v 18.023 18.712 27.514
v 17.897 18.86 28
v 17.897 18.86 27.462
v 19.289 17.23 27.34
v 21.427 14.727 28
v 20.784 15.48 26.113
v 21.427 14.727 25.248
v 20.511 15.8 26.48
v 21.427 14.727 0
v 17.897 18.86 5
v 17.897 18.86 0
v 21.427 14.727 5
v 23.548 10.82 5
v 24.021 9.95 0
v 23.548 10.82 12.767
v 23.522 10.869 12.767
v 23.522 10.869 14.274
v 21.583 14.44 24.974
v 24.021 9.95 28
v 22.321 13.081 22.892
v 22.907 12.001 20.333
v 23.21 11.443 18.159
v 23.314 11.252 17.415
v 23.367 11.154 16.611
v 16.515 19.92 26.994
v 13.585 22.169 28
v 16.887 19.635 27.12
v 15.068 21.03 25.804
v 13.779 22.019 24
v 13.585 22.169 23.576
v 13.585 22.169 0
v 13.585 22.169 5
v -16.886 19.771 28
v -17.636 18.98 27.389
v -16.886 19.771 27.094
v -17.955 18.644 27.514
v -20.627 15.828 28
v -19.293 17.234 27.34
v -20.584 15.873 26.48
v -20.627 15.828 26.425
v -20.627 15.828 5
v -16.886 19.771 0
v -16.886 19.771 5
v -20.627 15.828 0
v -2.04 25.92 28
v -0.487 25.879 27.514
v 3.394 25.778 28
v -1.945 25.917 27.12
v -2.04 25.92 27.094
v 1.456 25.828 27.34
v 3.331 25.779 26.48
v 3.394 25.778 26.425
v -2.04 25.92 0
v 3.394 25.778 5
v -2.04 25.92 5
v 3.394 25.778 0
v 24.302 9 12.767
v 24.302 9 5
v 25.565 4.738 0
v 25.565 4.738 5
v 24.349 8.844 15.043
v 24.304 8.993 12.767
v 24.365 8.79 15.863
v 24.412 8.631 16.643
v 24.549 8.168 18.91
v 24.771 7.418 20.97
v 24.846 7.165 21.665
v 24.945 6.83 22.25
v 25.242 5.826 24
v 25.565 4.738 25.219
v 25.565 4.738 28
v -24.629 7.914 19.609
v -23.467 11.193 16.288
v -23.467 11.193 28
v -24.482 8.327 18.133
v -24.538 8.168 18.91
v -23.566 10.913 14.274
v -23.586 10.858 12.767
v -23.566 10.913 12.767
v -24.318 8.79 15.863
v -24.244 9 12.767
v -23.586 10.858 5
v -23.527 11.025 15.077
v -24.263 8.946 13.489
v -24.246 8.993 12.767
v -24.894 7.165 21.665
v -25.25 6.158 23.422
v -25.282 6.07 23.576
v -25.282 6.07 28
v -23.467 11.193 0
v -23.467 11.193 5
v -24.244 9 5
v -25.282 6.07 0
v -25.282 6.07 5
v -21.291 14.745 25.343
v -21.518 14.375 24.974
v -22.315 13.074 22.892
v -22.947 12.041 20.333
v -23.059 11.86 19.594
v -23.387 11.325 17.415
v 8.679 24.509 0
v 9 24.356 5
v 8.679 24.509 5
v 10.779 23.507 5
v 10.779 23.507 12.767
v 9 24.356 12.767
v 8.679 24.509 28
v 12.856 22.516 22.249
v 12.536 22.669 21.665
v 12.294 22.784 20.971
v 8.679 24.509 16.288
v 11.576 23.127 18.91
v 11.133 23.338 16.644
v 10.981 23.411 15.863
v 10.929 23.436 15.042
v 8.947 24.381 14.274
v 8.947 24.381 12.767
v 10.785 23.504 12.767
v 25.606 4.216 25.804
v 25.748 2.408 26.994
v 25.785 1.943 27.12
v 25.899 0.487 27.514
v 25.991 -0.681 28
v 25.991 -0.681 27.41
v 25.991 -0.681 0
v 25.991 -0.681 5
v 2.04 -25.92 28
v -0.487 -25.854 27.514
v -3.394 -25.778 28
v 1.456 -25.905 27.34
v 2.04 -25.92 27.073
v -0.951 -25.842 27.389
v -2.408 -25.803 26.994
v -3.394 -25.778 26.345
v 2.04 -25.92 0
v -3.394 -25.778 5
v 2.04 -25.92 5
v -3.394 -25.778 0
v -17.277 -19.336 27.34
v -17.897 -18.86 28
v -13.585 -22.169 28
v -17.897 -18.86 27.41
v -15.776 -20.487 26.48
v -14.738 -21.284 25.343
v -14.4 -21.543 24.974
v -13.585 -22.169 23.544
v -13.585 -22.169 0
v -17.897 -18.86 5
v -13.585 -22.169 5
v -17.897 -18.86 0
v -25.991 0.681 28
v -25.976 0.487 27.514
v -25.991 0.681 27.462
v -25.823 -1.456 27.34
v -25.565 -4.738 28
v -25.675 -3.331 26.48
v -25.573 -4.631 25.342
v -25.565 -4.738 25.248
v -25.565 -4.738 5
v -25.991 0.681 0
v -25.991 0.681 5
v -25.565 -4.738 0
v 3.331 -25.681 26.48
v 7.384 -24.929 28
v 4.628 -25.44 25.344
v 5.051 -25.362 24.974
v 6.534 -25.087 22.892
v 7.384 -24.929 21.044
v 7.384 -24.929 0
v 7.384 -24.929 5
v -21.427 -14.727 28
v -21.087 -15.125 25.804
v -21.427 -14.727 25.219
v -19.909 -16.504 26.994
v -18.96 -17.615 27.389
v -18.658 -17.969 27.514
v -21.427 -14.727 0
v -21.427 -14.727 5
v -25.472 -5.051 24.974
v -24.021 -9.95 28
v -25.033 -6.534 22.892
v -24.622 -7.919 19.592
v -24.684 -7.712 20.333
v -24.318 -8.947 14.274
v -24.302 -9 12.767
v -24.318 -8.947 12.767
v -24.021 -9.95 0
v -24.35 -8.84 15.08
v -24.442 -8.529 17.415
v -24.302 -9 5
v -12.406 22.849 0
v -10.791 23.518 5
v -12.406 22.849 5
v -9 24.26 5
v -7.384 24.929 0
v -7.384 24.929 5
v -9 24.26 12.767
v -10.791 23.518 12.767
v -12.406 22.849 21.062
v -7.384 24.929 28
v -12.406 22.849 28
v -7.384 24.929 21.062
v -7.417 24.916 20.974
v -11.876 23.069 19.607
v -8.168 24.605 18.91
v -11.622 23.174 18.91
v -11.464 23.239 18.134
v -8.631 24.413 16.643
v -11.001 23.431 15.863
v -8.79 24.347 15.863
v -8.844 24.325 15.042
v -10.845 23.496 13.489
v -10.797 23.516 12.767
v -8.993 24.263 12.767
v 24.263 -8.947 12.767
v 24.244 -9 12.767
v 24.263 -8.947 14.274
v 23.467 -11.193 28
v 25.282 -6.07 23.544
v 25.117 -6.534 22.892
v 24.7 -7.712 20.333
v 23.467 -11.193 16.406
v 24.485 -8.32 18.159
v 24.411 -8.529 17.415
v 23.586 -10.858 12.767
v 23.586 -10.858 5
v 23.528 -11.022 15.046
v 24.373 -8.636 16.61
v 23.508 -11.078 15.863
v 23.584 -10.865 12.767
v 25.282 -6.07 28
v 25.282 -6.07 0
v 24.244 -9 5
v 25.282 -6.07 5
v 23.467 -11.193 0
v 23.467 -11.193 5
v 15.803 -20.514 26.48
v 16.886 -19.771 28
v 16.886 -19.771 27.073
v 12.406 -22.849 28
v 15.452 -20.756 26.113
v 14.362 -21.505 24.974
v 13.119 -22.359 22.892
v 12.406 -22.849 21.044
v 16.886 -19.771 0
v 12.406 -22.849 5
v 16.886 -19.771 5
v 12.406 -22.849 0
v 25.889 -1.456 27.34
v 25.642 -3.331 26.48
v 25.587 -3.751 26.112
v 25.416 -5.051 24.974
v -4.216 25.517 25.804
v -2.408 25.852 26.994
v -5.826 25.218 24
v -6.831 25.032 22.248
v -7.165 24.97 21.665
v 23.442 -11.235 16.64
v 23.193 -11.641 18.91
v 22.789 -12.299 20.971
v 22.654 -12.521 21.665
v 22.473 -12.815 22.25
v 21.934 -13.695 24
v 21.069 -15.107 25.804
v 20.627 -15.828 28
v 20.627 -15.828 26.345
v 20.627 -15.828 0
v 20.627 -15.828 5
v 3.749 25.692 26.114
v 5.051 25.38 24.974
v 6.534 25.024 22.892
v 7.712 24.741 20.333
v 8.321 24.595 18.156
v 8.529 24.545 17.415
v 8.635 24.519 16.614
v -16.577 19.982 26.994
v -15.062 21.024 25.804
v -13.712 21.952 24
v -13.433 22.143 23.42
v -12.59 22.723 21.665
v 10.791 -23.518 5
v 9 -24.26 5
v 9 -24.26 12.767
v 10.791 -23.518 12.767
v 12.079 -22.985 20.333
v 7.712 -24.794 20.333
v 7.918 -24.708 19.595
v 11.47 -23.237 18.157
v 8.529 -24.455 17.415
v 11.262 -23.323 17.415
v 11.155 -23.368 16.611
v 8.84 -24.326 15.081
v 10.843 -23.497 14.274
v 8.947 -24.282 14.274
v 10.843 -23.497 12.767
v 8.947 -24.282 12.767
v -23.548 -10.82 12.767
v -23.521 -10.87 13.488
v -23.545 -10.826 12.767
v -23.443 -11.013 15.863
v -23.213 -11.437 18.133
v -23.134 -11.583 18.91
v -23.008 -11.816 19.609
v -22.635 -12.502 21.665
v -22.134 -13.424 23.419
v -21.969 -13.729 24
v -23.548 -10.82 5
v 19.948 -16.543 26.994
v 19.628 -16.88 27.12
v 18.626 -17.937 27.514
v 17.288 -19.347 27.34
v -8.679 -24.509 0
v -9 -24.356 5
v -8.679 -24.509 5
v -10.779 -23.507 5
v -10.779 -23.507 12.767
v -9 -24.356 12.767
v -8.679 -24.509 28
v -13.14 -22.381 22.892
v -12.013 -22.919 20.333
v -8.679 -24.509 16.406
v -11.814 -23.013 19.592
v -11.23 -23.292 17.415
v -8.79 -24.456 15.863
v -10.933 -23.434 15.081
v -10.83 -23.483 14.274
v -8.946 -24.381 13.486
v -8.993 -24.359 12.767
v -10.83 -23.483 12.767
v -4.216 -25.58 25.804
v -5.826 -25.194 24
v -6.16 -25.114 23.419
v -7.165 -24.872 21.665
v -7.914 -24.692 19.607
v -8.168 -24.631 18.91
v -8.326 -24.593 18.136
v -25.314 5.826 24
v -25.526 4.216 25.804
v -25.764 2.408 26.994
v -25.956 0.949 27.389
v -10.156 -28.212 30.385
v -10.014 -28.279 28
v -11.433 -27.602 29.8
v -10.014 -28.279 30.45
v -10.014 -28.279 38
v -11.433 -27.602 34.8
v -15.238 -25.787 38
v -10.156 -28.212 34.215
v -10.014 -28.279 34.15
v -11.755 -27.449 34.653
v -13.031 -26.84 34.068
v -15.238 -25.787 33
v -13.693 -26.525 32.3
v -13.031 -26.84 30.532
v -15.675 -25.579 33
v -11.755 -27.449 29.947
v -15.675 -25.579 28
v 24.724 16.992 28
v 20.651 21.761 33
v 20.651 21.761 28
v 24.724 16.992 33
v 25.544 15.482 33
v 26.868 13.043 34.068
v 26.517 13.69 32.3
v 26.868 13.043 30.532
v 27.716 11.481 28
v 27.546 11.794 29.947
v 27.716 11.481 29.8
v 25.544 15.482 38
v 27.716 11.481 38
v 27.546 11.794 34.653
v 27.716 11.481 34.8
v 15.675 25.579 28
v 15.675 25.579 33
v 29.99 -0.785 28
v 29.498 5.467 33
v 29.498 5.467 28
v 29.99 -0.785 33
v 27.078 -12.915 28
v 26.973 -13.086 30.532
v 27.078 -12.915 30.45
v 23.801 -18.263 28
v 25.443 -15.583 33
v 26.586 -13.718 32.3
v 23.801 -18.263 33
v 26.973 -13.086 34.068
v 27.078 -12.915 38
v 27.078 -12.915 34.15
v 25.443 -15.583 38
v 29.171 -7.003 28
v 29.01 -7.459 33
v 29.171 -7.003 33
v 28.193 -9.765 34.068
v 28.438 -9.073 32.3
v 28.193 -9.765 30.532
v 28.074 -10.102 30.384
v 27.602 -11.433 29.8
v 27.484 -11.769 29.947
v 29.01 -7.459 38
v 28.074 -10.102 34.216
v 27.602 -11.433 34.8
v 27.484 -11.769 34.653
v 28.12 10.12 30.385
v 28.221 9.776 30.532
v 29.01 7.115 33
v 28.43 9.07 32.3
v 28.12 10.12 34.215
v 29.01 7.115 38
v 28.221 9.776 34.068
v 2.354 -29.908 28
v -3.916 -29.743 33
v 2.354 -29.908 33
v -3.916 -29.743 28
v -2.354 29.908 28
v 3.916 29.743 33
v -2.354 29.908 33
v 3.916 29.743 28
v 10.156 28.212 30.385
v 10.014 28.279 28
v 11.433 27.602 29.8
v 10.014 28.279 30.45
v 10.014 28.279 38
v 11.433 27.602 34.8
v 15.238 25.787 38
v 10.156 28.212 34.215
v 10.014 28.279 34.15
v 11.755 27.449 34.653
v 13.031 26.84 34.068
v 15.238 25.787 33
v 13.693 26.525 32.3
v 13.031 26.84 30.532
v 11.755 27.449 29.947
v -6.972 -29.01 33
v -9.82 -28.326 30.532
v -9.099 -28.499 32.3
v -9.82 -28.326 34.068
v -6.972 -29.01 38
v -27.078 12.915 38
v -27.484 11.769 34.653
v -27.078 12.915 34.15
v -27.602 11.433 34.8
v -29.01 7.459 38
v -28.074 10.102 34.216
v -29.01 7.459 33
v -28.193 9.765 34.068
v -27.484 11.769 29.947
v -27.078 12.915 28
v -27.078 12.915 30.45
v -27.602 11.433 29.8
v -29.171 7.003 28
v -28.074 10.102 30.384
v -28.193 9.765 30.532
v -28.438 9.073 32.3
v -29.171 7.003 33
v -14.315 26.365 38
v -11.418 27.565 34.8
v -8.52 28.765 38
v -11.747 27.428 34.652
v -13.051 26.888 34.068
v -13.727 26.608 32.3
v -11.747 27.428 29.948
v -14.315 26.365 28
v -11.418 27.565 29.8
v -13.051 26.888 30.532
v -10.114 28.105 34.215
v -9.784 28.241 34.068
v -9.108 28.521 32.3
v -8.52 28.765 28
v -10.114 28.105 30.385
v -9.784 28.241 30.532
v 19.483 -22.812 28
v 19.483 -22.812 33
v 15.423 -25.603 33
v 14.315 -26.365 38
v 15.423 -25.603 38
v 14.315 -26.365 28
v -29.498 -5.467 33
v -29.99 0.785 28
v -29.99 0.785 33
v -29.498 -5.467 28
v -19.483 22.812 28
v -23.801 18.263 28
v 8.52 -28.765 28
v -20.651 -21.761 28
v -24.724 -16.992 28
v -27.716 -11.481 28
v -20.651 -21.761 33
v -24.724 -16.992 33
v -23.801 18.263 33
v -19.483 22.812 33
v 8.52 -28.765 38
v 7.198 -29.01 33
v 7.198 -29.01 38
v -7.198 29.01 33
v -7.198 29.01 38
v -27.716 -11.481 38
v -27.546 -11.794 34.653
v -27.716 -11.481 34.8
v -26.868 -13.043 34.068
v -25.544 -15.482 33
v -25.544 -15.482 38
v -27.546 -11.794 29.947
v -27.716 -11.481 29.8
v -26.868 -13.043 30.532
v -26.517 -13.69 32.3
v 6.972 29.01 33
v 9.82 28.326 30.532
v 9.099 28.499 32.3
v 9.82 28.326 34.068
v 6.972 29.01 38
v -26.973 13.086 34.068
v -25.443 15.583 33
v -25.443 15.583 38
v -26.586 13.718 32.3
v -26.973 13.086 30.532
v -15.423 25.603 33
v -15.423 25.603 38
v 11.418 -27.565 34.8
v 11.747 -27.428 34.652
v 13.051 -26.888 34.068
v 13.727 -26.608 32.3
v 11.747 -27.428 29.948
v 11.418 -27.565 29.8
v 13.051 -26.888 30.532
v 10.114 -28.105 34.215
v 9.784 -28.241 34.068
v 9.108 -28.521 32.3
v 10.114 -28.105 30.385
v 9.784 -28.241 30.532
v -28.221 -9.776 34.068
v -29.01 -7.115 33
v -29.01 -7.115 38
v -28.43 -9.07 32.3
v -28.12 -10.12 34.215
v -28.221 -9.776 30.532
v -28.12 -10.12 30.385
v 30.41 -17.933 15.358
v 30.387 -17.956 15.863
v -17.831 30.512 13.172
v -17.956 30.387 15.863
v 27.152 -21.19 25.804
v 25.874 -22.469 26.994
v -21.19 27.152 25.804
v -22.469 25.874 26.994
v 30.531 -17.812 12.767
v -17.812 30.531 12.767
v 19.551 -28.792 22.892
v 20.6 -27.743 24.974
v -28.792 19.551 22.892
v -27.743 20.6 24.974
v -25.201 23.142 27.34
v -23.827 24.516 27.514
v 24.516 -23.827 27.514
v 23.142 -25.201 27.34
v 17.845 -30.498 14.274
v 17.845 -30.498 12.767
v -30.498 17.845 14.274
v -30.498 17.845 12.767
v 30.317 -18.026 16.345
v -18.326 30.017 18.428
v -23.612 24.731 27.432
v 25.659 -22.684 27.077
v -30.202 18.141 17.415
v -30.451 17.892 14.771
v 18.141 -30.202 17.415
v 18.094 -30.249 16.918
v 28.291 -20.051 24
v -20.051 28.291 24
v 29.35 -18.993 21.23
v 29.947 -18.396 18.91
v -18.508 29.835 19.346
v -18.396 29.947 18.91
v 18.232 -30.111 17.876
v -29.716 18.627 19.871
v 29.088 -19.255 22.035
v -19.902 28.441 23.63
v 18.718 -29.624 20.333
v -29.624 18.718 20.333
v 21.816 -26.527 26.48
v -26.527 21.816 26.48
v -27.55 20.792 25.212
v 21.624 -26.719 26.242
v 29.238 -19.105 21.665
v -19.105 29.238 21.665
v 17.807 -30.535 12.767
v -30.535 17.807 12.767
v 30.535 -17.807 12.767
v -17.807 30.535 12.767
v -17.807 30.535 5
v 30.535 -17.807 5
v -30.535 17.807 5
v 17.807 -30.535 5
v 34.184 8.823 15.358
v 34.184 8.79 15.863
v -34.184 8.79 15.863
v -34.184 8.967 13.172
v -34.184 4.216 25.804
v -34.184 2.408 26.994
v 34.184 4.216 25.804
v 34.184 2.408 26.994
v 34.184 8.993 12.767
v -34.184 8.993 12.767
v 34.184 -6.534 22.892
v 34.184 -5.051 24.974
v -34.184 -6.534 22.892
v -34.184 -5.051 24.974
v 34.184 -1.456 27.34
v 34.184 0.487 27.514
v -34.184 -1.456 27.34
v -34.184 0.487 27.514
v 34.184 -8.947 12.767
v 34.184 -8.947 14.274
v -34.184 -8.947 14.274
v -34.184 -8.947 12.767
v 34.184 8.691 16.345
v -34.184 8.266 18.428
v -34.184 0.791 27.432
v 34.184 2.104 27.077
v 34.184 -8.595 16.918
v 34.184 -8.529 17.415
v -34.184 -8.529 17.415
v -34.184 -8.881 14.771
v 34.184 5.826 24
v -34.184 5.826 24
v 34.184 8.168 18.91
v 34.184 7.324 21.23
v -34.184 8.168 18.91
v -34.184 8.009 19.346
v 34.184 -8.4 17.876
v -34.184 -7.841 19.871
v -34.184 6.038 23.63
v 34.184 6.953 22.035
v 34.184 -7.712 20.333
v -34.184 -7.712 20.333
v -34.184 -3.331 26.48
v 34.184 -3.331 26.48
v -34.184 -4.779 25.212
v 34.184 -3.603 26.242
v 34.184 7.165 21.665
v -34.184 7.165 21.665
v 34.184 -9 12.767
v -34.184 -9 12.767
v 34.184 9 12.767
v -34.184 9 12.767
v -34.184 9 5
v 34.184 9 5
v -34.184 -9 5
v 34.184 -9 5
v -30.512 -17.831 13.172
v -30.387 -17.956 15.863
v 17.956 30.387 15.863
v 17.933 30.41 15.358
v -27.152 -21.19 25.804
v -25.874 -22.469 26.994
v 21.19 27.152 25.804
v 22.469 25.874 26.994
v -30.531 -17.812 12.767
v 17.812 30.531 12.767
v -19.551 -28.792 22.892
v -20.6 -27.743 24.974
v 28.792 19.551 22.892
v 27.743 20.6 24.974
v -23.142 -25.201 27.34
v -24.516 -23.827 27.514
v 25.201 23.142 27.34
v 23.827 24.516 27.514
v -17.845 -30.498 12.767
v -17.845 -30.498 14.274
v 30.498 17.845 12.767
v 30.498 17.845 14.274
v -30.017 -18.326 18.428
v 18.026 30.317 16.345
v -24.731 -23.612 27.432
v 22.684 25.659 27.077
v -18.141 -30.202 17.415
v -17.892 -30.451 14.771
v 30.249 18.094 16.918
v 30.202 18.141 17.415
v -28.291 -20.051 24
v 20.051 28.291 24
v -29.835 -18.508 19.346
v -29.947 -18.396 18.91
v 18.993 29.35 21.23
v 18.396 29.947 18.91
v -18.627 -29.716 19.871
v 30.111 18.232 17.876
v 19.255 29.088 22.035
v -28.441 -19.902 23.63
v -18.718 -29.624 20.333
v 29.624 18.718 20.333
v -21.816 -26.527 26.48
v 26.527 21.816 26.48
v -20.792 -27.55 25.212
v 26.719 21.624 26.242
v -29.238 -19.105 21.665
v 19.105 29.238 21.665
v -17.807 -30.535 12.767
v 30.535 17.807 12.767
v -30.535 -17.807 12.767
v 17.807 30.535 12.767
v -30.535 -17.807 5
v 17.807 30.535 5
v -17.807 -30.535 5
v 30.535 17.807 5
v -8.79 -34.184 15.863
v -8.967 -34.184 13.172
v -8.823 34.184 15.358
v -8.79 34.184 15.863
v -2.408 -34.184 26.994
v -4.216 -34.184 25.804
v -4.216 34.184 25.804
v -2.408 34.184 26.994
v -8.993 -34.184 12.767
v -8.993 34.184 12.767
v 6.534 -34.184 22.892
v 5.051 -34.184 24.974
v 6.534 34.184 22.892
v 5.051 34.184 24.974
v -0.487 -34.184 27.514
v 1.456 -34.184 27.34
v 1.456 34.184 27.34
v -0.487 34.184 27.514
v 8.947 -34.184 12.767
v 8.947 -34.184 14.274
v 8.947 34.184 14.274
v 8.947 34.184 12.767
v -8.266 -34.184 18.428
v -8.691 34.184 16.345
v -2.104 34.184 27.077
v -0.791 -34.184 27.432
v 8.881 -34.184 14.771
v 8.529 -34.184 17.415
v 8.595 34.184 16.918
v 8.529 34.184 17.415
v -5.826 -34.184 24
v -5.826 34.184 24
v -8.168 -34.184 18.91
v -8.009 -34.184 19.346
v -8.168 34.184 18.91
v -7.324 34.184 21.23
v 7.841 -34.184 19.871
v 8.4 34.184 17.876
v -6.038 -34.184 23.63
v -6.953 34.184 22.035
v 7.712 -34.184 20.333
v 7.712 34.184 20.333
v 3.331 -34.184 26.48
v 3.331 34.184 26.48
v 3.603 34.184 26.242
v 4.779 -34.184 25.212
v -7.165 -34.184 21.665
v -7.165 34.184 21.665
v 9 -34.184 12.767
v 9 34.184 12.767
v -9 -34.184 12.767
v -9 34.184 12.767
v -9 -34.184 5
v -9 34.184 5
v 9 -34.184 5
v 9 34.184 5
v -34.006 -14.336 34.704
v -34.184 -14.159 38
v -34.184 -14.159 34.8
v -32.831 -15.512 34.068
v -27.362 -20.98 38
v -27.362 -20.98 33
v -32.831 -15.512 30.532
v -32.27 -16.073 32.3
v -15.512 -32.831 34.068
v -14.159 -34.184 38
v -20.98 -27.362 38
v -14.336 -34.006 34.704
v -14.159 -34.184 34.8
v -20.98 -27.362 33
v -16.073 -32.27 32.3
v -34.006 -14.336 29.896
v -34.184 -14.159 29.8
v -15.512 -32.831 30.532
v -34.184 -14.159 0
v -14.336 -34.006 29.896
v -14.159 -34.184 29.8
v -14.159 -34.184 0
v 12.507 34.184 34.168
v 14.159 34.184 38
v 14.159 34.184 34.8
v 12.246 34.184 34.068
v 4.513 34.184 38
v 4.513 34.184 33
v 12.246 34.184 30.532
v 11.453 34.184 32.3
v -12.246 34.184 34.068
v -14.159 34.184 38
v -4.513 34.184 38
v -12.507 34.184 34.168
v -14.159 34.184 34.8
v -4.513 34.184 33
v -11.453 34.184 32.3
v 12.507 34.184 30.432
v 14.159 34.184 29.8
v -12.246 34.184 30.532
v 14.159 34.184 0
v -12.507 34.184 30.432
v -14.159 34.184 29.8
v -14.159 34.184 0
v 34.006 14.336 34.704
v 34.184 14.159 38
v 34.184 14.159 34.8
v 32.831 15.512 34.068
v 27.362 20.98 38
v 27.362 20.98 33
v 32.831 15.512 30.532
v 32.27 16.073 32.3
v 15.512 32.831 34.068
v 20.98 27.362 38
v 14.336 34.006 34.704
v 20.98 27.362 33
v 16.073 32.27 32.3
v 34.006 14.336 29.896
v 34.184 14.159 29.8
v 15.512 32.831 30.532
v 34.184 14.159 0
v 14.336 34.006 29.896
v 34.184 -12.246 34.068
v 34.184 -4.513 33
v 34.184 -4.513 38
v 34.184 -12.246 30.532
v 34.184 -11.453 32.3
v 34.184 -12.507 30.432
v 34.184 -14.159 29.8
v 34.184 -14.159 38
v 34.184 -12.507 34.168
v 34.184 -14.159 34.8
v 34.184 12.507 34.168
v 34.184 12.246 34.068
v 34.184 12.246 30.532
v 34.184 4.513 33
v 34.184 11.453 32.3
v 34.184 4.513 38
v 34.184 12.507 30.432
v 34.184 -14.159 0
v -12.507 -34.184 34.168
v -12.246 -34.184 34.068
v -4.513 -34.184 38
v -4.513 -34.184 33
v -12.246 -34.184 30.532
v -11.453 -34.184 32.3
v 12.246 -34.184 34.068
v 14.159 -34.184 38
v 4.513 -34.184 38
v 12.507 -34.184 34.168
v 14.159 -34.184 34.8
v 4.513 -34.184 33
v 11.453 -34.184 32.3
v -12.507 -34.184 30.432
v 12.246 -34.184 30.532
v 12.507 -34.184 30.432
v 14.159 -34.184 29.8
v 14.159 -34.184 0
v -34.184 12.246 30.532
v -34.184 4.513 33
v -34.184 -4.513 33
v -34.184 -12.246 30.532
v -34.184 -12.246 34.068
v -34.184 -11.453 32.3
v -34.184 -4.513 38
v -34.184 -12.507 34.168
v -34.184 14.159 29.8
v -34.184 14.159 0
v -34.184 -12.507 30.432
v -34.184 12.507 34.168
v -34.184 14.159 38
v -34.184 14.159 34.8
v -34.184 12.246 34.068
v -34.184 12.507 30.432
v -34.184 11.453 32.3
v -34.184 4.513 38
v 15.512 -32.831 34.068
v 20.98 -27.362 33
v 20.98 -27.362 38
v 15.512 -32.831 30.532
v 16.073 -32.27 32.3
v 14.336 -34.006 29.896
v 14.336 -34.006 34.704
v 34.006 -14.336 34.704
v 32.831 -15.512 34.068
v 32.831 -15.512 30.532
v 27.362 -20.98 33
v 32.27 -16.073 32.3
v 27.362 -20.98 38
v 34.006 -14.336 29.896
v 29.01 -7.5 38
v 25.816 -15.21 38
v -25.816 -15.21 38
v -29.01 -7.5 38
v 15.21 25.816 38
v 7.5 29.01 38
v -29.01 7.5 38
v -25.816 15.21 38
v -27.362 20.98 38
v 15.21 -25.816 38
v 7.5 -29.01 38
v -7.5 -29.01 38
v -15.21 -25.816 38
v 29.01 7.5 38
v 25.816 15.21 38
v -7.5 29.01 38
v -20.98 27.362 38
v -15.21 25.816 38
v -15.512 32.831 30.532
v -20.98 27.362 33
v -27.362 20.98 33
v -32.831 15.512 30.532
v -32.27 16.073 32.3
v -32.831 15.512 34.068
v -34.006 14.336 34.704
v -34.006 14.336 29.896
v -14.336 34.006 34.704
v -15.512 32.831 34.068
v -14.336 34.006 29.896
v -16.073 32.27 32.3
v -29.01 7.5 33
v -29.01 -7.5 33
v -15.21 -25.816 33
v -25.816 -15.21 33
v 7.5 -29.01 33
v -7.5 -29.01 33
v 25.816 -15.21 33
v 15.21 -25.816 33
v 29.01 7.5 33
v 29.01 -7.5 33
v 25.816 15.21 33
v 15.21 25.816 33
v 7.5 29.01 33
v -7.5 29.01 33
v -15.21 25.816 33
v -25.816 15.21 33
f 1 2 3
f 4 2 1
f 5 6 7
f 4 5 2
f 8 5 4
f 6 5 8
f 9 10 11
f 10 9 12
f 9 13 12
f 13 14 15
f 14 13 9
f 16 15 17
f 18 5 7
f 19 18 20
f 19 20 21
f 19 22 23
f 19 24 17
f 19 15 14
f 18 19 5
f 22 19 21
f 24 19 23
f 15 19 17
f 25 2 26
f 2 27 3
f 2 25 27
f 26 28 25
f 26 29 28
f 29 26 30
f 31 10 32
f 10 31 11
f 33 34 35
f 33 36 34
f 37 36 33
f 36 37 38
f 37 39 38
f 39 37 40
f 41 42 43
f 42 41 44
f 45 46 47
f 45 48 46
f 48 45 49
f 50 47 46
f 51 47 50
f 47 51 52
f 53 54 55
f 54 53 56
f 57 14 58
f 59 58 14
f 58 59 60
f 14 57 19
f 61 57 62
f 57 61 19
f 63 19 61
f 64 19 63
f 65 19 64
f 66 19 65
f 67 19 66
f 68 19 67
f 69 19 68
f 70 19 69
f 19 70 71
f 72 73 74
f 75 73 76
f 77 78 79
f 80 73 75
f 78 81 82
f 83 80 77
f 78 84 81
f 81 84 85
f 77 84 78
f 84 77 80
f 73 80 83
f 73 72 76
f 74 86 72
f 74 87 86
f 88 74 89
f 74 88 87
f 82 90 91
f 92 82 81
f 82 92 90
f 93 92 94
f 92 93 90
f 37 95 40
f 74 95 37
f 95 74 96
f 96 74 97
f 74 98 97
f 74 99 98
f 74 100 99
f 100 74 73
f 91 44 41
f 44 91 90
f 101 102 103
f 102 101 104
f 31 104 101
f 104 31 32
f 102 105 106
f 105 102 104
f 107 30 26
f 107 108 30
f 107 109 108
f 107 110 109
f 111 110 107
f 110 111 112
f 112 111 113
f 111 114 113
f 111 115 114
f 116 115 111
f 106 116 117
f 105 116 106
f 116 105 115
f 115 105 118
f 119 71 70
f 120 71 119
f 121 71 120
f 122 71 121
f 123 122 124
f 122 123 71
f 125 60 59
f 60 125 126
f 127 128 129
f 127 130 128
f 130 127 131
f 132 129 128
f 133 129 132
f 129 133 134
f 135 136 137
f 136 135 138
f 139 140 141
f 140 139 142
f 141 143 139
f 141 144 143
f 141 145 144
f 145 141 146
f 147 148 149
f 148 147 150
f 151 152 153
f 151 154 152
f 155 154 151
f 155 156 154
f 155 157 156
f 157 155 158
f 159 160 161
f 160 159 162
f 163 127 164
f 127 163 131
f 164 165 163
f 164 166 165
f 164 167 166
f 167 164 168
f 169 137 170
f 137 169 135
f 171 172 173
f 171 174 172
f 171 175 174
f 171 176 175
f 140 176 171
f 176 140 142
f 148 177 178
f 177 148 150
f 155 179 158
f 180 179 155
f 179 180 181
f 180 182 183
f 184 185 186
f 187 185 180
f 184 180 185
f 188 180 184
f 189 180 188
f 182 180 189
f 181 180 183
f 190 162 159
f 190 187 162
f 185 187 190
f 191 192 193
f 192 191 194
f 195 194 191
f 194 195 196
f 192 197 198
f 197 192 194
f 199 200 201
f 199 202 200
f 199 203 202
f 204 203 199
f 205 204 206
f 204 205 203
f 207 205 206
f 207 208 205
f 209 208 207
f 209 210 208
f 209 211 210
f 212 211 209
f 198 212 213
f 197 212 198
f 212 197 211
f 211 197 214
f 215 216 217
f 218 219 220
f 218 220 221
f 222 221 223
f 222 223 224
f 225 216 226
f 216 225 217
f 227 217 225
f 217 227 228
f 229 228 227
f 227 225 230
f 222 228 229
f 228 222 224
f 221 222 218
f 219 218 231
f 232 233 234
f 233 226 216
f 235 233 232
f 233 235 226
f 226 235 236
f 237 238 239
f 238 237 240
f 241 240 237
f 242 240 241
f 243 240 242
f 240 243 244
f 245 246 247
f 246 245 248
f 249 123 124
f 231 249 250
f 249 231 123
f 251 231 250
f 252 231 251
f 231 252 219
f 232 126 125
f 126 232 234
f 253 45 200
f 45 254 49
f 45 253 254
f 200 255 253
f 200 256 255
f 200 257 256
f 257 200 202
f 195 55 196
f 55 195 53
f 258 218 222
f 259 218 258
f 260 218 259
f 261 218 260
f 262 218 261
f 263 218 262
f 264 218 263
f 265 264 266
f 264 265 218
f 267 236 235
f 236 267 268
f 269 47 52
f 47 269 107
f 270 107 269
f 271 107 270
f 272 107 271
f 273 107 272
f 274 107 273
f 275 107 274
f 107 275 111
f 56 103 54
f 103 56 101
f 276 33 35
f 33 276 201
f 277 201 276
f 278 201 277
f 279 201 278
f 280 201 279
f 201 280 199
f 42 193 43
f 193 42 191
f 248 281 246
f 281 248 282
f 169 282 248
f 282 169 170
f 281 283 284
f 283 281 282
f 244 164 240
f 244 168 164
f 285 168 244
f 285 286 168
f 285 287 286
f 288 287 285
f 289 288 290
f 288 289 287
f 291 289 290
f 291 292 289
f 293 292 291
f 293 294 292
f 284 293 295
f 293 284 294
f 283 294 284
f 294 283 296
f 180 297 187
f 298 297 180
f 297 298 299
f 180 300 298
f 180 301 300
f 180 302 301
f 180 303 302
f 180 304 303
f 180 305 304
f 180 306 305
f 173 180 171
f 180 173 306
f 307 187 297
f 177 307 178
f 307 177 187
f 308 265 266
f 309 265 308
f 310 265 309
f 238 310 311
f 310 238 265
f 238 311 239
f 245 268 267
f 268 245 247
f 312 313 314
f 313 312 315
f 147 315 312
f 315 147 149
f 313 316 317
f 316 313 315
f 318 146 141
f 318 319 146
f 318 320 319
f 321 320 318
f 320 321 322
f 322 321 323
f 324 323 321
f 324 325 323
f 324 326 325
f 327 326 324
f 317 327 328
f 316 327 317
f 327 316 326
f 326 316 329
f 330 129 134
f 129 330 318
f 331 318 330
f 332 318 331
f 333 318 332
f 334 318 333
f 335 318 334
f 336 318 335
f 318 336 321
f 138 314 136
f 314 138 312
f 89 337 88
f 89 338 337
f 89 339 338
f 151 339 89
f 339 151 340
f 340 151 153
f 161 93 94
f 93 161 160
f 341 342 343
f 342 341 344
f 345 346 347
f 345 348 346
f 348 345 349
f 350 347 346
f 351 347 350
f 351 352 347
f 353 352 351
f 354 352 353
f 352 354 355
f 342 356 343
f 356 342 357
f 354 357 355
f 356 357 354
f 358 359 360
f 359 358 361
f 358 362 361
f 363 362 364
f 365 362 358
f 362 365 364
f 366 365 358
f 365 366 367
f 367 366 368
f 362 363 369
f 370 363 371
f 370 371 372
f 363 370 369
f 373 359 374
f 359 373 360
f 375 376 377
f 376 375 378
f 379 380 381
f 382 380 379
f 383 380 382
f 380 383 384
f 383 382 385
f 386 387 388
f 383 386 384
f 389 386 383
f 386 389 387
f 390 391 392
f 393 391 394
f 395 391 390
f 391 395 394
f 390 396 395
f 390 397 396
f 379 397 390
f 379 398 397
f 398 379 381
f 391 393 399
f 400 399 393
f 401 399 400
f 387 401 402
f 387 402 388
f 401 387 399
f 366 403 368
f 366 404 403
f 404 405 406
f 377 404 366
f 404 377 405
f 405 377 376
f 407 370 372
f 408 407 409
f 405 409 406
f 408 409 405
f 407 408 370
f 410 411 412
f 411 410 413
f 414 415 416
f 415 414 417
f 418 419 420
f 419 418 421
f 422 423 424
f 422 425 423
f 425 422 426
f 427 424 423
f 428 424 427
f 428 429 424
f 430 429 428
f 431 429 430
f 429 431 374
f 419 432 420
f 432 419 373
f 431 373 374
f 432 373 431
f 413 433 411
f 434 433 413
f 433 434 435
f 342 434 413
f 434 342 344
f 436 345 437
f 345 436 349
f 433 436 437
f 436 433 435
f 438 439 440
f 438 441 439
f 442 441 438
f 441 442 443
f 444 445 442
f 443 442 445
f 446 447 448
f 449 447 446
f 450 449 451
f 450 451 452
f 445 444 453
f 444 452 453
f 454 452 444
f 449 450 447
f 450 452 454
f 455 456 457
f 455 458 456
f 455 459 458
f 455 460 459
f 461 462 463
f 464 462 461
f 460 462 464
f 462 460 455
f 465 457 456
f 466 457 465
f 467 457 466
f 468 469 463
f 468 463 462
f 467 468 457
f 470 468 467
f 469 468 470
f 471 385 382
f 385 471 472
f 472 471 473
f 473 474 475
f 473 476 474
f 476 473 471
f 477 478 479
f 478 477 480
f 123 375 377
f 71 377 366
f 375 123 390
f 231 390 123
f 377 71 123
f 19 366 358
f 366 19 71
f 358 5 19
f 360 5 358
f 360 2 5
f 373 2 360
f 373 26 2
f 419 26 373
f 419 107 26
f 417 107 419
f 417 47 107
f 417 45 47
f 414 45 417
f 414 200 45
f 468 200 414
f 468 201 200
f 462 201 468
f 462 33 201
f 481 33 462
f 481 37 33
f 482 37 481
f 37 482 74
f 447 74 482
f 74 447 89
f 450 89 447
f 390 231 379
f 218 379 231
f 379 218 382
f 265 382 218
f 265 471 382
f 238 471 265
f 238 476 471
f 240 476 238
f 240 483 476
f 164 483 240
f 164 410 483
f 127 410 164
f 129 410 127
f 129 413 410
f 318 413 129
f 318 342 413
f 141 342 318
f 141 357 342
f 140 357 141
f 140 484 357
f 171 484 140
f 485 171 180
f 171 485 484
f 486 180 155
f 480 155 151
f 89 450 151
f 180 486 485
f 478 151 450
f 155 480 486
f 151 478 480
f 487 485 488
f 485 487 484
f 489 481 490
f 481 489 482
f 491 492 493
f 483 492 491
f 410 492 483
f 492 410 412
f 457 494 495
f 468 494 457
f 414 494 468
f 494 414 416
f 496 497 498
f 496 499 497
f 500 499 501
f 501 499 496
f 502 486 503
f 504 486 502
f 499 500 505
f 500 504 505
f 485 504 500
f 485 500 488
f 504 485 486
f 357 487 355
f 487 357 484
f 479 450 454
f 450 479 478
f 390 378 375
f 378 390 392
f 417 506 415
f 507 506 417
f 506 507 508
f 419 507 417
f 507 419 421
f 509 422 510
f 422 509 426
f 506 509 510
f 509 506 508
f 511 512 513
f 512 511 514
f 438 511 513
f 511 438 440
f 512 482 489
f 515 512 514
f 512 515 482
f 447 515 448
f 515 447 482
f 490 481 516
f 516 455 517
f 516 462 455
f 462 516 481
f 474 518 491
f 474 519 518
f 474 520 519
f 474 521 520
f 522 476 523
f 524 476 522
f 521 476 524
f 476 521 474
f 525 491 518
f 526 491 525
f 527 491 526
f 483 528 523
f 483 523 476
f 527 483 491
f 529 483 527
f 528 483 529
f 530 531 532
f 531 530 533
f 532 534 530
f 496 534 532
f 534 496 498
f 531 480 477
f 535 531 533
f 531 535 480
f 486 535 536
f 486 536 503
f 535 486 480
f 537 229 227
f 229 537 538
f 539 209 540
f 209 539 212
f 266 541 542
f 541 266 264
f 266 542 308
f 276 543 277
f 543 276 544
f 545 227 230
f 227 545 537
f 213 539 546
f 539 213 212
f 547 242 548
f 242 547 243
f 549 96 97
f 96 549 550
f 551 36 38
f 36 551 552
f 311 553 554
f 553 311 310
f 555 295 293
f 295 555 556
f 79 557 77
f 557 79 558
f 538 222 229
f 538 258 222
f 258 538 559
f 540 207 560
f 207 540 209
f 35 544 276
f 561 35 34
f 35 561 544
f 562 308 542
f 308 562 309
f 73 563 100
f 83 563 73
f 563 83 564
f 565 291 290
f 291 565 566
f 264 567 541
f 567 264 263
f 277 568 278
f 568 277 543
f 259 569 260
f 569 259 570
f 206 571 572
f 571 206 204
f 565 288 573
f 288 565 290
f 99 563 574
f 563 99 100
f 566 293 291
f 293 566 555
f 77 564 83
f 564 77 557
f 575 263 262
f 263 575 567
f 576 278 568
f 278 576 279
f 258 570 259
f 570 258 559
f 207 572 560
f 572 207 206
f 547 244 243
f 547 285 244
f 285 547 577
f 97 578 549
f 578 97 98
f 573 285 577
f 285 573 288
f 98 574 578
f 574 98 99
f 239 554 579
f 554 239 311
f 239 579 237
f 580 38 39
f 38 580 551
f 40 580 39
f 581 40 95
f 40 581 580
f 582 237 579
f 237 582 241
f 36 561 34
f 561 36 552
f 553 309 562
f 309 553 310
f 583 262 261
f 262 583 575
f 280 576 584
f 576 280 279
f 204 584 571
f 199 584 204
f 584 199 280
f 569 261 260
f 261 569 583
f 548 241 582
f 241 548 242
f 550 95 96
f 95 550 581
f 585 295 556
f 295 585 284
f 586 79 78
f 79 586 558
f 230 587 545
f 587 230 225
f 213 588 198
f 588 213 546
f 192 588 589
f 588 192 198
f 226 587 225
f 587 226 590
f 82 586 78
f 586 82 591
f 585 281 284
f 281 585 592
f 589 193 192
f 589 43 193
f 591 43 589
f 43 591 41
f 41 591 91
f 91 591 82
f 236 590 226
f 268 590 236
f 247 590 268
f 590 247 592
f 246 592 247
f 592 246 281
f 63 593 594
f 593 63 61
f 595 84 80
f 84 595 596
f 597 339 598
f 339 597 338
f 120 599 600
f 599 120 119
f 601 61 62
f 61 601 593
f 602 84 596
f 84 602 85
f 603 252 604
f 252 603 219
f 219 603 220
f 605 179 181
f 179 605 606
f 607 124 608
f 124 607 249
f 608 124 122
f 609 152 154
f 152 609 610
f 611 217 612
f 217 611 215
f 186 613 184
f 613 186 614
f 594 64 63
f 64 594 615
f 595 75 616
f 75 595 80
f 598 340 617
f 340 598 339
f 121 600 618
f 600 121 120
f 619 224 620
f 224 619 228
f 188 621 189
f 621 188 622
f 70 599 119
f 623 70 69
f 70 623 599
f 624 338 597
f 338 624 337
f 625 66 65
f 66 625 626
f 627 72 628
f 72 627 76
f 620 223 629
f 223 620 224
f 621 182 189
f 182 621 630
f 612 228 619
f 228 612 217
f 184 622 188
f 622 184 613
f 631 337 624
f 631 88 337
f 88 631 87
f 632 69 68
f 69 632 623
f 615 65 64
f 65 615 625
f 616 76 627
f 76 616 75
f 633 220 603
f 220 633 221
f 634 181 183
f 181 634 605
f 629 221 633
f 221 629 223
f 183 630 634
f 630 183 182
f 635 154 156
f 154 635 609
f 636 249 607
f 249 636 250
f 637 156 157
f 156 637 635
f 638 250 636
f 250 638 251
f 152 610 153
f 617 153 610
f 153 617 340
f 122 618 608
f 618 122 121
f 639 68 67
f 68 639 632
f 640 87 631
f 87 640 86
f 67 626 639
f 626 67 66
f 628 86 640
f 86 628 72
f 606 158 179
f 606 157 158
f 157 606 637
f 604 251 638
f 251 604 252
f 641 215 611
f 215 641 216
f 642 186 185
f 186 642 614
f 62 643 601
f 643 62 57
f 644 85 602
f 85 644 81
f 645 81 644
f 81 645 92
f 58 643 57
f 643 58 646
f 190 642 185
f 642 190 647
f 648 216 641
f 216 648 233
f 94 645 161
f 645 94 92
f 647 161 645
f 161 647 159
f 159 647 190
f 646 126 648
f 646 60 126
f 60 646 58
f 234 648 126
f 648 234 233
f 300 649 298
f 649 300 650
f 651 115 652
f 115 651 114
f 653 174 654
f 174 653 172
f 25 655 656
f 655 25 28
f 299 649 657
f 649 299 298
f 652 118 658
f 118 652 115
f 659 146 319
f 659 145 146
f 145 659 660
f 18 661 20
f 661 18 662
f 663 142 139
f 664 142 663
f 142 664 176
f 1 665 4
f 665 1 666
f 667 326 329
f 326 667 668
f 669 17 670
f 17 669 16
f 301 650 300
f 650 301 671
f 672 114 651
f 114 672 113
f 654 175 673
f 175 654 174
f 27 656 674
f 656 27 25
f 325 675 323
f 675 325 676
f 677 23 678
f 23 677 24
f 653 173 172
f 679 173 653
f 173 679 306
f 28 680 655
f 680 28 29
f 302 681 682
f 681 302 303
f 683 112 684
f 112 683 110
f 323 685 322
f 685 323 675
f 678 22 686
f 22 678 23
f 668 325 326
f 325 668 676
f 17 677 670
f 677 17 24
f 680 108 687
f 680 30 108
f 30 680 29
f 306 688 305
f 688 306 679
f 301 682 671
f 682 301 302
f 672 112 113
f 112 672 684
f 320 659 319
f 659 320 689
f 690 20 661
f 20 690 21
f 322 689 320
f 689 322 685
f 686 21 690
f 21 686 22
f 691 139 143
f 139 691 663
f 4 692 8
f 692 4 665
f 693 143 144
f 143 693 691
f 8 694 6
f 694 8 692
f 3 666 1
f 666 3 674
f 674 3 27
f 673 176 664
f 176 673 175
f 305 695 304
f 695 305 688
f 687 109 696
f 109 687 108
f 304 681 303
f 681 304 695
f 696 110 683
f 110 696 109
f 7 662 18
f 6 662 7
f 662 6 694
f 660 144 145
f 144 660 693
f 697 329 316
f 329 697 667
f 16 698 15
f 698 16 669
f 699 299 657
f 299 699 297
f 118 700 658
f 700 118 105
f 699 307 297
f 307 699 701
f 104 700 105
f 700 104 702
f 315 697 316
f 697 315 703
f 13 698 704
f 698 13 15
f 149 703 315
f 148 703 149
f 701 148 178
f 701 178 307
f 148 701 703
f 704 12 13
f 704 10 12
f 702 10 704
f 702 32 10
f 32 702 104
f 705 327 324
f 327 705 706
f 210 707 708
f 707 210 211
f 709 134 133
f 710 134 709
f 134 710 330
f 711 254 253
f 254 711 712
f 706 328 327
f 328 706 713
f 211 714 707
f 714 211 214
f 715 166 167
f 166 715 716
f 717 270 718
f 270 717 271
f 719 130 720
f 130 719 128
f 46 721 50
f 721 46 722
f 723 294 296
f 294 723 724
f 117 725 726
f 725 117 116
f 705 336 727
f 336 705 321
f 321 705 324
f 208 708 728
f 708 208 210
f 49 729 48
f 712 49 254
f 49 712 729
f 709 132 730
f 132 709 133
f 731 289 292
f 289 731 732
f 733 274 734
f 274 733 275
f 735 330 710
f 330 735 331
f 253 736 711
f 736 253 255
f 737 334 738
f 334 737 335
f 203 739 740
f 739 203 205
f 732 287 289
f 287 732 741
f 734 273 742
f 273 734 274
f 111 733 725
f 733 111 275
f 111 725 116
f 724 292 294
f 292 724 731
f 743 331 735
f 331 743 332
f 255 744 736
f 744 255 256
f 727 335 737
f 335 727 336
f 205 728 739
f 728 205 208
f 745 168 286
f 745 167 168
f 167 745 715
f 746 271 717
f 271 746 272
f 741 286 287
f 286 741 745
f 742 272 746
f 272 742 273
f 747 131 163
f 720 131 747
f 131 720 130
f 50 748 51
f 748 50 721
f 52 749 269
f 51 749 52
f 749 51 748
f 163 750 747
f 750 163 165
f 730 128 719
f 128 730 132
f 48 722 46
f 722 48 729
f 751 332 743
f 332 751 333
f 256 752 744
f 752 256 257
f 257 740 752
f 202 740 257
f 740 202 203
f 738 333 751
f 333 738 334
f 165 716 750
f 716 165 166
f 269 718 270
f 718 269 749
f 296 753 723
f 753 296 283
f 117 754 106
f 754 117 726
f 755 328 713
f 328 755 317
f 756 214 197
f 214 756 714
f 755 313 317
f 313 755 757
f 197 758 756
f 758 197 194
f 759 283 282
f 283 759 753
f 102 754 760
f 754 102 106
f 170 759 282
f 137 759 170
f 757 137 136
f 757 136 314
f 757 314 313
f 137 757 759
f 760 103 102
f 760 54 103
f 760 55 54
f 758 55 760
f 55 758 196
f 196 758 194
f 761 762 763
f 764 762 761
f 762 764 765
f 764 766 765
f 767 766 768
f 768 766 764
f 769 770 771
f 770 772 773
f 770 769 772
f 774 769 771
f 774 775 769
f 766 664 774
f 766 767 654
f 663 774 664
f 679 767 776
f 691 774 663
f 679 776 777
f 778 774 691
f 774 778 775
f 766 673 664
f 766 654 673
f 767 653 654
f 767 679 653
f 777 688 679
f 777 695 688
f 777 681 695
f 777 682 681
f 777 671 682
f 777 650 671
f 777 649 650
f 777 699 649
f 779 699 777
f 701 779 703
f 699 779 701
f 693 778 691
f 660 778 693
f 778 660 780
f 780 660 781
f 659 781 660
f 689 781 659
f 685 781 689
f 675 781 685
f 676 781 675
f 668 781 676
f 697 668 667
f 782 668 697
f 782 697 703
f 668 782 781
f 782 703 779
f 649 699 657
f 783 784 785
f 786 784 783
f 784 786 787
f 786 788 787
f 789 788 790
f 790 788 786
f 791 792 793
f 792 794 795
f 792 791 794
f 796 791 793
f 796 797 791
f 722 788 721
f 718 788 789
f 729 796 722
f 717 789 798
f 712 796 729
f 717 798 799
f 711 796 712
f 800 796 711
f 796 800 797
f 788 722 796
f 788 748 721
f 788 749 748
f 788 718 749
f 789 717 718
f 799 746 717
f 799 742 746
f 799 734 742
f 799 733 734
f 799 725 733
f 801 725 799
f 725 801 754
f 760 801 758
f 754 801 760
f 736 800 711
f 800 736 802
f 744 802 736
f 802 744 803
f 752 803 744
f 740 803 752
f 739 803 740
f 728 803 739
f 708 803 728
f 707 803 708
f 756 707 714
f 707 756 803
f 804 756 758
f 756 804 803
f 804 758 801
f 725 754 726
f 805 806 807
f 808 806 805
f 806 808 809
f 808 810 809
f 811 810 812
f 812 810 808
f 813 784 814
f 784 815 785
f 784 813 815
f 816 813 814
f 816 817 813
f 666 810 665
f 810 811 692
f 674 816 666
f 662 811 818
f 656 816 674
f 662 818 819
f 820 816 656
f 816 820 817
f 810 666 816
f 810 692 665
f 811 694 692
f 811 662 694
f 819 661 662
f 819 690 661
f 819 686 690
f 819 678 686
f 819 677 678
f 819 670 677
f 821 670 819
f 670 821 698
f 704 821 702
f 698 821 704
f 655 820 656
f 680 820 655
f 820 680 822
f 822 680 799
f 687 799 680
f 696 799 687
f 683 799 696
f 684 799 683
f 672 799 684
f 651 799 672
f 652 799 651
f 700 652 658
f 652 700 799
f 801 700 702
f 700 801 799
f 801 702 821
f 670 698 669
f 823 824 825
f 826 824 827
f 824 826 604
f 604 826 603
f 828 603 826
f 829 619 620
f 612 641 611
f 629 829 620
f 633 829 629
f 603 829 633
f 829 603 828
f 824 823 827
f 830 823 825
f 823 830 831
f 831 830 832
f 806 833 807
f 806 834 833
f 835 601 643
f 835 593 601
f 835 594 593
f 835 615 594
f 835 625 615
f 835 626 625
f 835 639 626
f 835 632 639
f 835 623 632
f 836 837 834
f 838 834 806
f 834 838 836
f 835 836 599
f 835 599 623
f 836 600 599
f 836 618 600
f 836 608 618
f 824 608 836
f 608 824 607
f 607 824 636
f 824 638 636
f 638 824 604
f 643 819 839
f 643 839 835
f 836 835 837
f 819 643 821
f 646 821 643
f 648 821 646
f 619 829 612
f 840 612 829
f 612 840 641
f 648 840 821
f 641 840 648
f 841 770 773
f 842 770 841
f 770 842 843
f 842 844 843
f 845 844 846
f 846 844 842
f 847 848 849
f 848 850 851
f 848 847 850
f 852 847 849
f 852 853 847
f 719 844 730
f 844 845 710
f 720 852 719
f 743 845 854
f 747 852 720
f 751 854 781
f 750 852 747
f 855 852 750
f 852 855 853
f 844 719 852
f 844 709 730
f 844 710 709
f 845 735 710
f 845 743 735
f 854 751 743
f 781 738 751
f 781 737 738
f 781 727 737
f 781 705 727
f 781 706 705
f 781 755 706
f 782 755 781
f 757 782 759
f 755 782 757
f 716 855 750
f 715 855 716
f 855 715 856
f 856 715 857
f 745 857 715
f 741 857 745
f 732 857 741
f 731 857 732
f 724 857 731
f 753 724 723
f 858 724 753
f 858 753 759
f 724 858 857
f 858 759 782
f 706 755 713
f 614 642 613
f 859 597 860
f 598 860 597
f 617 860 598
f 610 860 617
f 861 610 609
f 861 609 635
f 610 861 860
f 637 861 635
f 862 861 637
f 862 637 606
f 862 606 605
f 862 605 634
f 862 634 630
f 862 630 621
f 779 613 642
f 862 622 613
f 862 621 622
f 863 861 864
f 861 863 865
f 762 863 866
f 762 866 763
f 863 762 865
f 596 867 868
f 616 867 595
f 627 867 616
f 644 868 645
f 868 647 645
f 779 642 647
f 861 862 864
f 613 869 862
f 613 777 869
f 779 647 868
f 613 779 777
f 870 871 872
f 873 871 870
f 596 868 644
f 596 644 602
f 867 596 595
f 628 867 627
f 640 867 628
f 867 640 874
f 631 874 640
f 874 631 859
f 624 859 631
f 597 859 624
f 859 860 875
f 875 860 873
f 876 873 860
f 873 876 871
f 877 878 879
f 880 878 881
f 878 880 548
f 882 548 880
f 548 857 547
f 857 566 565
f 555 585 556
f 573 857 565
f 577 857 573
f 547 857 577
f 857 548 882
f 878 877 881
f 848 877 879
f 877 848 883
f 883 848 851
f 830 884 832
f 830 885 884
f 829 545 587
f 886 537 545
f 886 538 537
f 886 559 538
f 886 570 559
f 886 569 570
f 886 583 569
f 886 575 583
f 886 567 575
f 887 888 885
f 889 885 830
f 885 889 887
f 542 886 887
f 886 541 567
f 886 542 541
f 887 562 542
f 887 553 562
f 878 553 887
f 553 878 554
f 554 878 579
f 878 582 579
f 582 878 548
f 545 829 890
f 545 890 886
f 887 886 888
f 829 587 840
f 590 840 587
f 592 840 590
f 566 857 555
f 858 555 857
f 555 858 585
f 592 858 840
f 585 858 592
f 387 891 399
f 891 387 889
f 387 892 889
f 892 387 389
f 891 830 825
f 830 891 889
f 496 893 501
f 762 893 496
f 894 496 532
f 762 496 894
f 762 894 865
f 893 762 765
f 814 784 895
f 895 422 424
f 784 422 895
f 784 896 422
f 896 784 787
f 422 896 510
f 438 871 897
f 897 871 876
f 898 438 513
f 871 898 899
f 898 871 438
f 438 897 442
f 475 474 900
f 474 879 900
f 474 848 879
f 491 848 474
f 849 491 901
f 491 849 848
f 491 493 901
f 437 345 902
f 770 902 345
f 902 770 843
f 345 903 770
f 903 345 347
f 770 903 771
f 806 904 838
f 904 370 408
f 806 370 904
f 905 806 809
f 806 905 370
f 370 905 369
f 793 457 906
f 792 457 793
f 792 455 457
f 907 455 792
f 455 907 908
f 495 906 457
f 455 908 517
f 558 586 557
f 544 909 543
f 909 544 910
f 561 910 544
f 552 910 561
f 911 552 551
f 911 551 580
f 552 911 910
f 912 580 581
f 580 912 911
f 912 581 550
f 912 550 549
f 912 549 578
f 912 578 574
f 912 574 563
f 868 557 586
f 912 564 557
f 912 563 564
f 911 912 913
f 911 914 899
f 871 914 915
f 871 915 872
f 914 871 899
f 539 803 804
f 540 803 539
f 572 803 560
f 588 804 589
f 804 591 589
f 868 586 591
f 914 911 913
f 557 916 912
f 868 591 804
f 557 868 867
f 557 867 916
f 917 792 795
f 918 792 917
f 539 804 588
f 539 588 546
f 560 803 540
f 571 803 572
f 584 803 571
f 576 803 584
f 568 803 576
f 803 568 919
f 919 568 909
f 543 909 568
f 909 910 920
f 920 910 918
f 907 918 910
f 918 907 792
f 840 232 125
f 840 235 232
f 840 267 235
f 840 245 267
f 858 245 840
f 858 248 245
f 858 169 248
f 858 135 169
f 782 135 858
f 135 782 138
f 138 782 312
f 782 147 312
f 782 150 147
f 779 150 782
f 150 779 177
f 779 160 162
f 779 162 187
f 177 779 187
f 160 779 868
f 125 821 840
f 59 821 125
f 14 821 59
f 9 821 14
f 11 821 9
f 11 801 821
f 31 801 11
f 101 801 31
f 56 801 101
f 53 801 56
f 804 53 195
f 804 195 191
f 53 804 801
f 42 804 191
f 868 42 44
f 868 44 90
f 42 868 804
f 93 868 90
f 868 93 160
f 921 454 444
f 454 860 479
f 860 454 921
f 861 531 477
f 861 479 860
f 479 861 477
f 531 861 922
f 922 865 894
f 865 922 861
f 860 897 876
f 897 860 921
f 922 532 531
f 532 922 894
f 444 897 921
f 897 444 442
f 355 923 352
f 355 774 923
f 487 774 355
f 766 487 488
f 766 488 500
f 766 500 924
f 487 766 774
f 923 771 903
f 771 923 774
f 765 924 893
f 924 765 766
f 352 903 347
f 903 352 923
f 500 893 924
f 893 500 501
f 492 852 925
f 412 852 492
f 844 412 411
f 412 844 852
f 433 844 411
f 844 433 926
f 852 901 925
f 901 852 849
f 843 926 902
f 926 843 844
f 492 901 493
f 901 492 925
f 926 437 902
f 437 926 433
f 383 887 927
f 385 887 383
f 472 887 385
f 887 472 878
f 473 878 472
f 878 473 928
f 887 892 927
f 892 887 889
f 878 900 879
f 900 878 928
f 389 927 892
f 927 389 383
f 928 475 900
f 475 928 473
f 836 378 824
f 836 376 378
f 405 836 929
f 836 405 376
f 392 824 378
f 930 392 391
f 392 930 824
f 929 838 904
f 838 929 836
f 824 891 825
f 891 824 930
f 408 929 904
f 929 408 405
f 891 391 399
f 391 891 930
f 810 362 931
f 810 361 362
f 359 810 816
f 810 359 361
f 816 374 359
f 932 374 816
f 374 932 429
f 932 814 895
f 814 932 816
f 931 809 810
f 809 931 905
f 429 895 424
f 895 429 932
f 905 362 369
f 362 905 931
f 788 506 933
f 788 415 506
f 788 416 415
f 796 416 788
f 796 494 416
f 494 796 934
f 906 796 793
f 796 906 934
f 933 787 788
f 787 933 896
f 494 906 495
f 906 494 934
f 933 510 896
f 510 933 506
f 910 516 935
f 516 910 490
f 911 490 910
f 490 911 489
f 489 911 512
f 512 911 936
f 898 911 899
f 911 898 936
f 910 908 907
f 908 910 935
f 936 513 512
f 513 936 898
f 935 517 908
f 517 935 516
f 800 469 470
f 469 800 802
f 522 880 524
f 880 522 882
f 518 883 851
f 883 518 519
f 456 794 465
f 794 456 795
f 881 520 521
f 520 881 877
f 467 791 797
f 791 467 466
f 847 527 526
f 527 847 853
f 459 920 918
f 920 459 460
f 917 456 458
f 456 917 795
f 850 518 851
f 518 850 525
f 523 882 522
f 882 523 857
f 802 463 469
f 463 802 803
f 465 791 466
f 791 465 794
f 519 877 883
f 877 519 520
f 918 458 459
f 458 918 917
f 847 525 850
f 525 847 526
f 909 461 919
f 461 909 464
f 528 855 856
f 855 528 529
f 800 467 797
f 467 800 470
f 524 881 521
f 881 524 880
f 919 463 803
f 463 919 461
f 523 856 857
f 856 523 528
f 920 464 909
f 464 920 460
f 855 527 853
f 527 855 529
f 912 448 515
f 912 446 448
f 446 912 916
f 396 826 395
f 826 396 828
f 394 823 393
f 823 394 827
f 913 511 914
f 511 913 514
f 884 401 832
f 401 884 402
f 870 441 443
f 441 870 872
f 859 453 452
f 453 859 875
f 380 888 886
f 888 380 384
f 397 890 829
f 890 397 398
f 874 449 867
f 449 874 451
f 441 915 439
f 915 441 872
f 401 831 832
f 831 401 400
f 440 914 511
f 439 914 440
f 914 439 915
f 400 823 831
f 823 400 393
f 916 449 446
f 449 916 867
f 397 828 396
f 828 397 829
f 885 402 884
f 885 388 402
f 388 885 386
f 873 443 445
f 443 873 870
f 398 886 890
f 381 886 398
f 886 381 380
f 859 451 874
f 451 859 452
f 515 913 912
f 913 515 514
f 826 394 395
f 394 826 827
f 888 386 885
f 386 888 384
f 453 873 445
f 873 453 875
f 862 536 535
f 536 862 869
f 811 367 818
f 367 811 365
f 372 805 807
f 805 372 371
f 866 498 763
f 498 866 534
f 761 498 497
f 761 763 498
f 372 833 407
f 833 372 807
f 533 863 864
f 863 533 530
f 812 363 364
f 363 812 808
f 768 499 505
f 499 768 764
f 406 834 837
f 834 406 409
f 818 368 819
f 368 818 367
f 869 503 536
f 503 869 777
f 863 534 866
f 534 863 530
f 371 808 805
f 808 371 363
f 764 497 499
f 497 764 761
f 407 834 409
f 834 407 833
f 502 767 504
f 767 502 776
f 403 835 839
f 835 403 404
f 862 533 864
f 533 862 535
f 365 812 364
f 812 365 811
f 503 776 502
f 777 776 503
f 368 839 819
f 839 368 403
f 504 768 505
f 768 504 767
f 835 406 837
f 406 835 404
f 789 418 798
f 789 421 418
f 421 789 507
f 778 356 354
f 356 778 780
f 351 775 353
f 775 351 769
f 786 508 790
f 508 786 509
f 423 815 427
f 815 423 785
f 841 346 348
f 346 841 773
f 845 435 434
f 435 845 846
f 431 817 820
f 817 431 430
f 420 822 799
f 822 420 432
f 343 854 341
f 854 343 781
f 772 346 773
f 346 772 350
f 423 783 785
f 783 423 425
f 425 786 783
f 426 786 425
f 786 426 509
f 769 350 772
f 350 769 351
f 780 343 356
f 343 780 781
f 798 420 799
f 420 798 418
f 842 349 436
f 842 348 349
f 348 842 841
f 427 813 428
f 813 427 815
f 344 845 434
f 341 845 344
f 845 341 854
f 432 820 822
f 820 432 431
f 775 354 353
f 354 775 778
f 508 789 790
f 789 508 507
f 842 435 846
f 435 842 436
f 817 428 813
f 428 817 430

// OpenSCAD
// is the width of the spool hub
reelWidth = 38; // [35:100]

module core() {

	innerCylWidth = max(10, (reelWidth/4));

	//echo(innerCylWidth);
	union() {
		// x was 60
		translate([0,0,-0.05])cylinder(reelWidth+0.1,26,26);
	    // translate z was 60
		translate([0,0,min(reelWidth,reelWidth-(innerCylWidth+0))])
			cylinder(innerCylWidth+.05,30,30);
	}
}

module arch() {
     //   reelWidth was 25
	translate([0,0,reelWidth/3])union() {
		difference() {
			// z scale was 3.3
			scale([1,1,reelWidth/23])
				rotate([90,0,22.5])
					translate([0,0,-50])
						cylinder(100,9,9);
			translate([-50,-50,-50])
				cube([100,100,50]);
		}
		// cube z was 21
	    // translate z was -20
		rotate([0,0,22.5]) 
			translate([-9,-50,-((reelWidth/3)-5)])
				cube([18,100,(reelWidth/3.0)-4.9]);
	}
}
module eTrangle(height,length) {
	rotate([0,0,-30])
	difference() {
		cube([length,length,height]);
		translate([0,0,-0.5])rotate([0,0,60])cube([length*1.2,length*1.2,height+1]);
		translate([length,0,-0.5])rotate([0,0,30])cube([length*1.2,length*1.2,height+1]);
	}
}
module reel() {
	difference() {
		cylinder(reelWidth,37,37,$fn=8);
		core();
		arch();
		rotate([0,0,45]) arch();
		rotate([0,0,90]) arch();
		rotate([0,0,135]) arch();
	}
}
module drumCentre() {
	filamentHoleRotation =  reelWidth < 60 ? 22.5 : 0;
	difference() {
		
		rotate([0,0,22.5])reel();

		for (i=[0:7]) {
			//rotate([0,0,i*45])translate([-42,0,-0.1])eTrangle(5.2,15);
			// translate z was 71
			rotate([0,0,i*45])translate([-42,0,reelWidth-5])eTrangle(5.1,15);
		}
		// filament holes
		for (i=[0:3]) {
             // translate y was 65
			rotate([90,0,(i*45)+filamentHoleRotation]) translate([0,reelWidth*.85,-50]) 
				cylinder(100,2.5,2.5);
		}

	}
}
module arm() {
	translate([34.25,-7.5,0]) difference() {
		union() {
			translate([0,0,0])cube([65,15,5]);
			translate([7.45,7.5,0])rotate([0,0,180])eTrangle(5,14.5);
		}
		translate([5,-0.1,-0.1])cube([45,5.1,5.2]);
		translate([5,10.1,-0.1])cube([45,5.1,5.2]);
		translate([62.5,4,-0.1])rotate([0,0,210])eTrangle(5.2,10);
		translate([62.5,11,-0.1])rotate([0,0,150])eTrangle(5.2,10);
	}
}
module loadArm() {
	import_stl("spool2arm.stl",convexity=10);
}
module edge(withHoles) {
	union() {
		difference() {
			cylinder(5,99.6,99.6,$fn=60);
			translate([0,0,-0.1])cylinder(5.2,84.6,84.6,$fn=60);
			translate([-105,-102.45,-0.1])cube([210,110,10]);
			rotate([0,0,45])translate([-105,-7.55,-0.1])cube([210,110,10]);
			if (withHoles) {
				translate([90.5,18,-0.1]) cylinder(5.2,2.5,2.5);
				translate([87.5,30,-0.1]) cylinder(5.2,2.5,2.5);
				translate([82.5,42,-0.1]) cylinder(5.2,2.5,2.5);
				translate([76,52,-0.1]) cylinder(5.2,2.5,2.5);
			}
		}
		rotate([0,0,45])translate([86.85,-3.6,0])rotate([0,0,-30]) eTrangle(5,9.8);
		translate([96.65,3.6,0])rotate([0,0,150]) eTrangle(5,9.8);
	}
}
module spool() {
	translate([5,0,0])import_stl("spool2core.stl",convexity=10);
	for (i=[0:7]) {
		rotate([0,0,i*45])loadArm();
		rotate([0,0,i*45])translate([0,0,71])loadArm();
		rotate([0,0,i*45])edge((i%2)==0);
		rotate([0,0,i*45])translate([0,0,71])edge((i%2)==1);
	}
}
module explodedSpool() {
	translate([5,0,0])import_stl("spool2core.stl",convexity=10);
	for (i=[0:7]) {
		rotate([0,0,i*45])translate([10,0,0]) loadArm();
		rotate([0,0,i*45])translate([10,0,71])loadArm();
		rotate([0,0,i*45])translate([20,10,0]) edge((i%2)==0);
		rotate([0,0,i*45])translate([20,10,71])edge((i%2)==1);
	}
}

//%color([0.5,0.5,0.5,0.1]) translate([-50,-50,-1.01]) cube([100,100,1]);
module arms(allSix) {
	translate([-75,-6,0]) arm();
	translate([-57,6,0]) arm();
	translate([-57,-18,0]) arm();
	translate([-75,18,0]) arm();
	if (allSix)  {
		translate([-75,-30,0]) arm();
		translate([-57,30,0]) arm();
	}
}
module edges() {
	translate([2,-10,0])rotate([0,0,67.5])translate([-85,-33.5,0]) edge(true);
	translate([2,10,0])rotate([0,0,67.5])translate([-85,-33.5,0]) edge(false);
	translate([2,30,0])rotate([0,0,67.5])translate([-85,-33.5,0]) edge(true);
	translate([2,-30,0])rotate([0,0,67.5])translate([-85,-33.5,0]) edge(false);
}

//arms(false);
//edges();
//translate([0,-200,0])arms(true);
//translate([125,-200,0])arm();
//translate([250,-200,0])edges();
//translate([250,0,0])spool();
//explodedSpool();
//translate([125,-200,0])translate([5,0,0])import_stl("spool2core.stl",convexity=10);
drumCentre();
